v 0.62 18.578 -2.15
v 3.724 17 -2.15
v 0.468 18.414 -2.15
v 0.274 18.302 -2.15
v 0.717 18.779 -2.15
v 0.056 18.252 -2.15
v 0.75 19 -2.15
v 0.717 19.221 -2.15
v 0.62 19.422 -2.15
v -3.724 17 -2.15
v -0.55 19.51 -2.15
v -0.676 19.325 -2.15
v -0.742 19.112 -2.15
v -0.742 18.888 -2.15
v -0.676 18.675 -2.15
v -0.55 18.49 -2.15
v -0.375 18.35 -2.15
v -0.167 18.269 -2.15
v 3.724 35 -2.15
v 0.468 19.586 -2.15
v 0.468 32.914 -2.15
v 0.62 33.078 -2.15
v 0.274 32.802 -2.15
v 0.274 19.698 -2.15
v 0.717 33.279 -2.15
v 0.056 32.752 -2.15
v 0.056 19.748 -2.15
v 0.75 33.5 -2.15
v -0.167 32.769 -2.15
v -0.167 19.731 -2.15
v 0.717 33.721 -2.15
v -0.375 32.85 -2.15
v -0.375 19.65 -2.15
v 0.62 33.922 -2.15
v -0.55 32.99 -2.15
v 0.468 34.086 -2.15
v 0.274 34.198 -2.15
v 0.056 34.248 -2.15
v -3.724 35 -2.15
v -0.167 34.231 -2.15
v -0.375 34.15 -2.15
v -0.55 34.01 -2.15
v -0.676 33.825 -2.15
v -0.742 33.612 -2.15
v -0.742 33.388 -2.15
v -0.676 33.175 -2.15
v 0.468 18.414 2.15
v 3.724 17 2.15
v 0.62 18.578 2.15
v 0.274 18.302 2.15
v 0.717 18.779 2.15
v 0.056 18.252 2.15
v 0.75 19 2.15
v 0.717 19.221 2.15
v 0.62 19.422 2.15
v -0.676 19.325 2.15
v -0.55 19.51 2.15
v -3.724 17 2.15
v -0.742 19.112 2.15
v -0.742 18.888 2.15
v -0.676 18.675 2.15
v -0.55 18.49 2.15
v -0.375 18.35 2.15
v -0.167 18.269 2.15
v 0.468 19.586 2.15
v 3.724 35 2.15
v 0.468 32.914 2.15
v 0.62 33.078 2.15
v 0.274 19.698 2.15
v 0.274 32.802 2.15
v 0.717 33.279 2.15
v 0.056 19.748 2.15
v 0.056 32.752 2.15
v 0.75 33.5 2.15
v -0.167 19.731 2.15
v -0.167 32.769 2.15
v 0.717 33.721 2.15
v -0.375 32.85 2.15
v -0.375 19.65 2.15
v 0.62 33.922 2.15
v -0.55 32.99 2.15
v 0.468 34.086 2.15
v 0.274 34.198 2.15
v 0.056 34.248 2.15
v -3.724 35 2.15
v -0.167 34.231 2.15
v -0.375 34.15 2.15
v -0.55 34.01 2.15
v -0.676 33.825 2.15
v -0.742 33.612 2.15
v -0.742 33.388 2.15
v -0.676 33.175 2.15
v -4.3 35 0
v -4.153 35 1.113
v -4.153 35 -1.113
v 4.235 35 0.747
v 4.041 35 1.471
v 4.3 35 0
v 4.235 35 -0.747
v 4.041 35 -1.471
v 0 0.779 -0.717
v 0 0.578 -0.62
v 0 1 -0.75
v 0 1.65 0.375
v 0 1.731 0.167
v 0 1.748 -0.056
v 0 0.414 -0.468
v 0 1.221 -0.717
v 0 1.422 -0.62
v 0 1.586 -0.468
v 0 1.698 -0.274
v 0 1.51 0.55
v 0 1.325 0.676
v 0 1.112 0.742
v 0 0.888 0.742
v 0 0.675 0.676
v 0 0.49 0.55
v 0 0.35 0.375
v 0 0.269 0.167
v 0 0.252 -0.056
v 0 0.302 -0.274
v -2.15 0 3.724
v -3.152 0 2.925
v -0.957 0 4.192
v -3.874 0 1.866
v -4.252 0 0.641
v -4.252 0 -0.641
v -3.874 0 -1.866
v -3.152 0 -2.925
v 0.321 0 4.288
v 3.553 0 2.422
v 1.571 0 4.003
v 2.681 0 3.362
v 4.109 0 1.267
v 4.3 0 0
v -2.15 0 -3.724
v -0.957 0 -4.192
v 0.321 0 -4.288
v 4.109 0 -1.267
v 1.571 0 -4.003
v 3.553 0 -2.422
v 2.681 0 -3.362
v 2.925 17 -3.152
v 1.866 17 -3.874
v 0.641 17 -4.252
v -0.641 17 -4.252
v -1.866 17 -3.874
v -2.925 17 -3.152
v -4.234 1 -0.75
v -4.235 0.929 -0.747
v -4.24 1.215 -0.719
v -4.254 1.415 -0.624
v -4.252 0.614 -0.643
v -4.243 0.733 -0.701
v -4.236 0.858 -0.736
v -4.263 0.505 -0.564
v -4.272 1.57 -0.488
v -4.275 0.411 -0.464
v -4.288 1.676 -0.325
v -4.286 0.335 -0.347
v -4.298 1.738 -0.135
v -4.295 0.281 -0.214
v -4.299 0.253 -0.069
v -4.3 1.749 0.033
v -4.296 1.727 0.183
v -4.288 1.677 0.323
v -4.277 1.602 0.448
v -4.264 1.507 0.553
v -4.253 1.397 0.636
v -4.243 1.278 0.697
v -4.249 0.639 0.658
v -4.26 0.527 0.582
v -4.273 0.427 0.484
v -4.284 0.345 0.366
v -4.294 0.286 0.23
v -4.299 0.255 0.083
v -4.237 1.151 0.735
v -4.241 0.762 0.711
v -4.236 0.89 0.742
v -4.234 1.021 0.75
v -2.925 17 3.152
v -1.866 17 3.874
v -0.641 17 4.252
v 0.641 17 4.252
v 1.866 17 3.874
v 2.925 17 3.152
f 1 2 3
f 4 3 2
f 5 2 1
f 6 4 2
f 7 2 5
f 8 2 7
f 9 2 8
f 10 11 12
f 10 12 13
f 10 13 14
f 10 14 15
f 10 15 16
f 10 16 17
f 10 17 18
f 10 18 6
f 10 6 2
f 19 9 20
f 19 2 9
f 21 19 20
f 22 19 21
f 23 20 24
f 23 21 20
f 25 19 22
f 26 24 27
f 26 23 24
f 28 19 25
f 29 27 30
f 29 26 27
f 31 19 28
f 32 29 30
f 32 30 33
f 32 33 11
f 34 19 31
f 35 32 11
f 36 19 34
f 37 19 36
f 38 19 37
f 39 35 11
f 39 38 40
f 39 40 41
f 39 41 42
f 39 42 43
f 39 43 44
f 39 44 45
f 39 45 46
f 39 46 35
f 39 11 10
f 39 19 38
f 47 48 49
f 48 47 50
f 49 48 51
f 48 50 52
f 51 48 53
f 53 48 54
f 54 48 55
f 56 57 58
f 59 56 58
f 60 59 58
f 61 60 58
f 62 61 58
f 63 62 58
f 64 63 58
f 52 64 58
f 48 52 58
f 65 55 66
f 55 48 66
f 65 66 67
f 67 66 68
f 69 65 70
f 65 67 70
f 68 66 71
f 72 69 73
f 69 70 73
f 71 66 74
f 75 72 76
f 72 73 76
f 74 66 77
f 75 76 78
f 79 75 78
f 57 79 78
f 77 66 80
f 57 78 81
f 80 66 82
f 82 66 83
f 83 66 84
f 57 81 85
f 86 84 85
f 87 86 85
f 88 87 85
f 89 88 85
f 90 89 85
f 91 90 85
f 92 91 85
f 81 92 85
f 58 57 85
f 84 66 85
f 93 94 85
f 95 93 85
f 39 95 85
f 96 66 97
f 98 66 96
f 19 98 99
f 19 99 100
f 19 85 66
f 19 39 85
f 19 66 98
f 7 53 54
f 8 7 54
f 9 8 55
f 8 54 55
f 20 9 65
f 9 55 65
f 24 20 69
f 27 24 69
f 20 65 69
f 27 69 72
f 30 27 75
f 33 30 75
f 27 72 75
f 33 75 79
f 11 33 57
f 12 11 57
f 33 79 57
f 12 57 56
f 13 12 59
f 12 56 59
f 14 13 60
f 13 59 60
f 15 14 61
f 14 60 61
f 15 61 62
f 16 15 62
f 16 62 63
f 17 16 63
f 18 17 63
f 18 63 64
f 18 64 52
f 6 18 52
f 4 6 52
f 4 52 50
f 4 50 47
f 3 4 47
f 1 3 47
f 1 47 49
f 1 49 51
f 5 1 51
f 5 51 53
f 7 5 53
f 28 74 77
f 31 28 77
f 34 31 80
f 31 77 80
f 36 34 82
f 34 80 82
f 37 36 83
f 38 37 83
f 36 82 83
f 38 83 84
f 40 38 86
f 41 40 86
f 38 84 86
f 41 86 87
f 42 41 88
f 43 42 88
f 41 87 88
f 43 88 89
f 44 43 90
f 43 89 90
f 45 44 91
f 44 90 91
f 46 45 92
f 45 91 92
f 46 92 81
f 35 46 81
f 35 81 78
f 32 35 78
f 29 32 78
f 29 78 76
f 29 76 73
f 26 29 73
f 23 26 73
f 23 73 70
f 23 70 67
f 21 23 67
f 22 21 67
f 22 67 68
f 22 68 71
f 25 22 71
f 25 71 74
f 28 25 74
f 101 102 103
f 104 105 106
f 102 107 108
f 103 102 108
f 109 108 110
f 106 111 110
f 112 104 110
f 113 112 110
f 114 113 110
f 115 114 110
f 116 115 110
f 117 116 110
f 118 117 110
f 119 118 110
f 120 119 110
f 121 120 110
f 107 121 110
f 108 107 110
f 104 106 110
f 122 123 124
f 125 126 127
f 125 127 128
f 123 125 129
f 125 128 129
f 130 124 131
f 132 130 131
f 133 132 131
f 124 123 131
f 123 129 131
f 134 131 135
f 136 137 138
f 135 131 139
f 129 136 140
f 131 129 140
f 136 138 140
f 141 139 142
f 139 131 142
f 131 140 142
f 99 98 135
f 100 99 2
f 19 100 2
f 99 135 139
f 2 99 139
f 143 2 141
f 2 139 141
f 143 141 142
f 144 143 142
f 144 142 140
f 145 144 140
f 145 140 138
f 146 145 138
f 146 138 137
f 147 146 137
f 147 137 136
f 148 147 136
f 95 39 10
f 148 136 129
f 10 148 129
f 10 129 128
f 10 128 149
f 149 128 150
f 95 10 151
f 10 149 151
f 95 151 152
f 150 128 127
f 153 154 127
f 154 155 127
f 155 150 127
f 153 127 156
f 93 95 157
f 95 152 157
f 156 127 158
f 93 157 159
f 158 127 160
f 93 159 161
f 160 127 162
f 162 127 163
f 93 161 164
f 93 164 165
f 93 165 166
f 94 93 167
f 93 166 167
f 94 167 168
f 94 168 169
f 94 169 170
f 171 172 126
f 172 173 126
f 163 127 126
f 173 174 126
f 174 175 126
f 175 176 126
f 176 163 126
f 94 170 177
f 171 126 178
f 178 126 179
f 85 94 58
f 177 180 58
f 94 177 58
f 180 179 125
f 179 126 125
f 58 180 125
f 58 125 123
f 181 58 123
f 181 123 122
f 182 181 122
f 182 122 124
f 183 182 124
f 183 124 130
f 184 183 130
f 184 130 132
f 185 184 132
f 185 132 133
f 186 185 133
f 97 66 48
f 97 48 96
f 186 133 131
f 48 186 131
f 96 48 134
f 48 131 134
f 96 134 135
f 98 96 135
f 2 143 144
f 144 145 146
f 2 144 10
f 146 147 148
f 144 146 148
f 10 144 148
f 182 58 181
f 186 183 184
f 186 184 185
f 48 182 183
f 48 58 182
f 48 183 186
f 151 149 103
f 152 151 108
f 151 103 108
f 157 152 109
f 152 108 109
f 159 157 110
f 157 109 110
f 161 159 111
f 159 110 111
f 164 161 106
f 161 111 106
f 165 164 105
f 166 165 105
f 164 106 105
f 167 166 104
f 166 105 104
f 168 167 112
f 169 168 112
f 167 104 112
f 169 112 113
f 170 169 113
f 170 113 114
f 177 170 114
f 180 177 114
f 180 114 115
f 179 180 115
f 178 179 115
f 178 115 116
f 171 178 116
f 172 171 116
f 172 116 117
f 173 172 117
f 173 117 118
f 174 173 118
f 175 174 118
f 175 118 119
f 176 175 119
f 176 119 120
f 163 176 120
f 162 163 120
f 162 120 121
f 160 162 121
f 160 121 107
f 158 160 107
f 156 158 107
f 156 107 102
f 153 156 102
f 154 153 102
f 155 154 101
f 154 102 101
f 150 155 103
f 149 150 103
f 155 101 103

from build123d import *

# Parameters (mm, degrees)
SKETCH2_R           = 4.3
BOSS_EXTRUDE2_DEPTH = 35
CUT_EXTRUDE2_DEPTH  = 18
SKETCH6_R           = 0.75
CUT_EXTRUDE3_DEPTH  = 10
SKETCH8_R           = 0.75
CUT_EXTRUDE5_DEPTH  = 5.3
SKETCH9_R           = 0.75
CUT_EXTRUDE6_DEPTH  = 10


with BuildPart() as part:
    # Sketch2 → Boss-Extrude2 (new body)
    with BuildSketch(Plane(origin=(0, 0, 0), x_dir=(1, 0, 0), z_dir=(0, 1, 0))):
        Circle(SKETCH2_R)
    extrude(amount=BOSS_EXTRUDE2_DEPTH)

    # Sketch4 → Cut-Extrude2 (cut)
    with BuildSketch(Plane(origin=(0, 35, 0), x_dir=(1, 0, 0), z_dir=(0, 1, 0))):
        with BuildLine():
            Line((0, 2.15), (-3.723909236, 2.15))
            ThreePointArc((-3.723909236, 2.15), (0, 4.3), (3.723909236, 2.15))
            Line((3.723909236, 2.15), (0, 2.15))
        make_face()
        with BuildLine():
            Line((0, -2.15), (-3.723909236, -2.15))
            ThreePointArc((-3.723909236, -2.15), (0, -4.3), (3.723909236, -2.15))
            Line((3.723909236, -2.15), (0, -2.15))
        make_face()
    extrude(amount=-CUT_EXTRUDE2_DEPTH, mode=Mode.SUBTRACT)

    # Sketch6 → Cut-Extrude3 (cut)
    with BuildSketch(Plane.XY.offset(2.15)):
        with Locations((0, 19)):
            Circle(SKETCH6_R)
    extrude(amount=-CUT_EXTRUDE3_DEPTH, mode=Mode.SUBTRACT)

    # Sketch8 → Cut-Extrude5 (cut, through all)
    with BuildSketch(Plane(origin=(0, 0, 0), x_dir=(0, 0, -1), z_dir=(1, 0, 0))):
        with Locations((0, 1)):
            Circle(SKETCH8_R)
    extrude(amount=-CUT_EXTRUDE5_DEPTH, mode=Mode.SUBTRACT)

    # Sketch9 → Cut-Extrude6 (cut)
    with BuildSketch(Plane.XY.offset(2.15)):
        with Locations((0, 33.5)):
            Circle(SKETCH9_R)
    extrude(amount=-CUT_EXTRUDE6_DEPTH, mode=Mode.SUBTRACT)


solid = part.part
